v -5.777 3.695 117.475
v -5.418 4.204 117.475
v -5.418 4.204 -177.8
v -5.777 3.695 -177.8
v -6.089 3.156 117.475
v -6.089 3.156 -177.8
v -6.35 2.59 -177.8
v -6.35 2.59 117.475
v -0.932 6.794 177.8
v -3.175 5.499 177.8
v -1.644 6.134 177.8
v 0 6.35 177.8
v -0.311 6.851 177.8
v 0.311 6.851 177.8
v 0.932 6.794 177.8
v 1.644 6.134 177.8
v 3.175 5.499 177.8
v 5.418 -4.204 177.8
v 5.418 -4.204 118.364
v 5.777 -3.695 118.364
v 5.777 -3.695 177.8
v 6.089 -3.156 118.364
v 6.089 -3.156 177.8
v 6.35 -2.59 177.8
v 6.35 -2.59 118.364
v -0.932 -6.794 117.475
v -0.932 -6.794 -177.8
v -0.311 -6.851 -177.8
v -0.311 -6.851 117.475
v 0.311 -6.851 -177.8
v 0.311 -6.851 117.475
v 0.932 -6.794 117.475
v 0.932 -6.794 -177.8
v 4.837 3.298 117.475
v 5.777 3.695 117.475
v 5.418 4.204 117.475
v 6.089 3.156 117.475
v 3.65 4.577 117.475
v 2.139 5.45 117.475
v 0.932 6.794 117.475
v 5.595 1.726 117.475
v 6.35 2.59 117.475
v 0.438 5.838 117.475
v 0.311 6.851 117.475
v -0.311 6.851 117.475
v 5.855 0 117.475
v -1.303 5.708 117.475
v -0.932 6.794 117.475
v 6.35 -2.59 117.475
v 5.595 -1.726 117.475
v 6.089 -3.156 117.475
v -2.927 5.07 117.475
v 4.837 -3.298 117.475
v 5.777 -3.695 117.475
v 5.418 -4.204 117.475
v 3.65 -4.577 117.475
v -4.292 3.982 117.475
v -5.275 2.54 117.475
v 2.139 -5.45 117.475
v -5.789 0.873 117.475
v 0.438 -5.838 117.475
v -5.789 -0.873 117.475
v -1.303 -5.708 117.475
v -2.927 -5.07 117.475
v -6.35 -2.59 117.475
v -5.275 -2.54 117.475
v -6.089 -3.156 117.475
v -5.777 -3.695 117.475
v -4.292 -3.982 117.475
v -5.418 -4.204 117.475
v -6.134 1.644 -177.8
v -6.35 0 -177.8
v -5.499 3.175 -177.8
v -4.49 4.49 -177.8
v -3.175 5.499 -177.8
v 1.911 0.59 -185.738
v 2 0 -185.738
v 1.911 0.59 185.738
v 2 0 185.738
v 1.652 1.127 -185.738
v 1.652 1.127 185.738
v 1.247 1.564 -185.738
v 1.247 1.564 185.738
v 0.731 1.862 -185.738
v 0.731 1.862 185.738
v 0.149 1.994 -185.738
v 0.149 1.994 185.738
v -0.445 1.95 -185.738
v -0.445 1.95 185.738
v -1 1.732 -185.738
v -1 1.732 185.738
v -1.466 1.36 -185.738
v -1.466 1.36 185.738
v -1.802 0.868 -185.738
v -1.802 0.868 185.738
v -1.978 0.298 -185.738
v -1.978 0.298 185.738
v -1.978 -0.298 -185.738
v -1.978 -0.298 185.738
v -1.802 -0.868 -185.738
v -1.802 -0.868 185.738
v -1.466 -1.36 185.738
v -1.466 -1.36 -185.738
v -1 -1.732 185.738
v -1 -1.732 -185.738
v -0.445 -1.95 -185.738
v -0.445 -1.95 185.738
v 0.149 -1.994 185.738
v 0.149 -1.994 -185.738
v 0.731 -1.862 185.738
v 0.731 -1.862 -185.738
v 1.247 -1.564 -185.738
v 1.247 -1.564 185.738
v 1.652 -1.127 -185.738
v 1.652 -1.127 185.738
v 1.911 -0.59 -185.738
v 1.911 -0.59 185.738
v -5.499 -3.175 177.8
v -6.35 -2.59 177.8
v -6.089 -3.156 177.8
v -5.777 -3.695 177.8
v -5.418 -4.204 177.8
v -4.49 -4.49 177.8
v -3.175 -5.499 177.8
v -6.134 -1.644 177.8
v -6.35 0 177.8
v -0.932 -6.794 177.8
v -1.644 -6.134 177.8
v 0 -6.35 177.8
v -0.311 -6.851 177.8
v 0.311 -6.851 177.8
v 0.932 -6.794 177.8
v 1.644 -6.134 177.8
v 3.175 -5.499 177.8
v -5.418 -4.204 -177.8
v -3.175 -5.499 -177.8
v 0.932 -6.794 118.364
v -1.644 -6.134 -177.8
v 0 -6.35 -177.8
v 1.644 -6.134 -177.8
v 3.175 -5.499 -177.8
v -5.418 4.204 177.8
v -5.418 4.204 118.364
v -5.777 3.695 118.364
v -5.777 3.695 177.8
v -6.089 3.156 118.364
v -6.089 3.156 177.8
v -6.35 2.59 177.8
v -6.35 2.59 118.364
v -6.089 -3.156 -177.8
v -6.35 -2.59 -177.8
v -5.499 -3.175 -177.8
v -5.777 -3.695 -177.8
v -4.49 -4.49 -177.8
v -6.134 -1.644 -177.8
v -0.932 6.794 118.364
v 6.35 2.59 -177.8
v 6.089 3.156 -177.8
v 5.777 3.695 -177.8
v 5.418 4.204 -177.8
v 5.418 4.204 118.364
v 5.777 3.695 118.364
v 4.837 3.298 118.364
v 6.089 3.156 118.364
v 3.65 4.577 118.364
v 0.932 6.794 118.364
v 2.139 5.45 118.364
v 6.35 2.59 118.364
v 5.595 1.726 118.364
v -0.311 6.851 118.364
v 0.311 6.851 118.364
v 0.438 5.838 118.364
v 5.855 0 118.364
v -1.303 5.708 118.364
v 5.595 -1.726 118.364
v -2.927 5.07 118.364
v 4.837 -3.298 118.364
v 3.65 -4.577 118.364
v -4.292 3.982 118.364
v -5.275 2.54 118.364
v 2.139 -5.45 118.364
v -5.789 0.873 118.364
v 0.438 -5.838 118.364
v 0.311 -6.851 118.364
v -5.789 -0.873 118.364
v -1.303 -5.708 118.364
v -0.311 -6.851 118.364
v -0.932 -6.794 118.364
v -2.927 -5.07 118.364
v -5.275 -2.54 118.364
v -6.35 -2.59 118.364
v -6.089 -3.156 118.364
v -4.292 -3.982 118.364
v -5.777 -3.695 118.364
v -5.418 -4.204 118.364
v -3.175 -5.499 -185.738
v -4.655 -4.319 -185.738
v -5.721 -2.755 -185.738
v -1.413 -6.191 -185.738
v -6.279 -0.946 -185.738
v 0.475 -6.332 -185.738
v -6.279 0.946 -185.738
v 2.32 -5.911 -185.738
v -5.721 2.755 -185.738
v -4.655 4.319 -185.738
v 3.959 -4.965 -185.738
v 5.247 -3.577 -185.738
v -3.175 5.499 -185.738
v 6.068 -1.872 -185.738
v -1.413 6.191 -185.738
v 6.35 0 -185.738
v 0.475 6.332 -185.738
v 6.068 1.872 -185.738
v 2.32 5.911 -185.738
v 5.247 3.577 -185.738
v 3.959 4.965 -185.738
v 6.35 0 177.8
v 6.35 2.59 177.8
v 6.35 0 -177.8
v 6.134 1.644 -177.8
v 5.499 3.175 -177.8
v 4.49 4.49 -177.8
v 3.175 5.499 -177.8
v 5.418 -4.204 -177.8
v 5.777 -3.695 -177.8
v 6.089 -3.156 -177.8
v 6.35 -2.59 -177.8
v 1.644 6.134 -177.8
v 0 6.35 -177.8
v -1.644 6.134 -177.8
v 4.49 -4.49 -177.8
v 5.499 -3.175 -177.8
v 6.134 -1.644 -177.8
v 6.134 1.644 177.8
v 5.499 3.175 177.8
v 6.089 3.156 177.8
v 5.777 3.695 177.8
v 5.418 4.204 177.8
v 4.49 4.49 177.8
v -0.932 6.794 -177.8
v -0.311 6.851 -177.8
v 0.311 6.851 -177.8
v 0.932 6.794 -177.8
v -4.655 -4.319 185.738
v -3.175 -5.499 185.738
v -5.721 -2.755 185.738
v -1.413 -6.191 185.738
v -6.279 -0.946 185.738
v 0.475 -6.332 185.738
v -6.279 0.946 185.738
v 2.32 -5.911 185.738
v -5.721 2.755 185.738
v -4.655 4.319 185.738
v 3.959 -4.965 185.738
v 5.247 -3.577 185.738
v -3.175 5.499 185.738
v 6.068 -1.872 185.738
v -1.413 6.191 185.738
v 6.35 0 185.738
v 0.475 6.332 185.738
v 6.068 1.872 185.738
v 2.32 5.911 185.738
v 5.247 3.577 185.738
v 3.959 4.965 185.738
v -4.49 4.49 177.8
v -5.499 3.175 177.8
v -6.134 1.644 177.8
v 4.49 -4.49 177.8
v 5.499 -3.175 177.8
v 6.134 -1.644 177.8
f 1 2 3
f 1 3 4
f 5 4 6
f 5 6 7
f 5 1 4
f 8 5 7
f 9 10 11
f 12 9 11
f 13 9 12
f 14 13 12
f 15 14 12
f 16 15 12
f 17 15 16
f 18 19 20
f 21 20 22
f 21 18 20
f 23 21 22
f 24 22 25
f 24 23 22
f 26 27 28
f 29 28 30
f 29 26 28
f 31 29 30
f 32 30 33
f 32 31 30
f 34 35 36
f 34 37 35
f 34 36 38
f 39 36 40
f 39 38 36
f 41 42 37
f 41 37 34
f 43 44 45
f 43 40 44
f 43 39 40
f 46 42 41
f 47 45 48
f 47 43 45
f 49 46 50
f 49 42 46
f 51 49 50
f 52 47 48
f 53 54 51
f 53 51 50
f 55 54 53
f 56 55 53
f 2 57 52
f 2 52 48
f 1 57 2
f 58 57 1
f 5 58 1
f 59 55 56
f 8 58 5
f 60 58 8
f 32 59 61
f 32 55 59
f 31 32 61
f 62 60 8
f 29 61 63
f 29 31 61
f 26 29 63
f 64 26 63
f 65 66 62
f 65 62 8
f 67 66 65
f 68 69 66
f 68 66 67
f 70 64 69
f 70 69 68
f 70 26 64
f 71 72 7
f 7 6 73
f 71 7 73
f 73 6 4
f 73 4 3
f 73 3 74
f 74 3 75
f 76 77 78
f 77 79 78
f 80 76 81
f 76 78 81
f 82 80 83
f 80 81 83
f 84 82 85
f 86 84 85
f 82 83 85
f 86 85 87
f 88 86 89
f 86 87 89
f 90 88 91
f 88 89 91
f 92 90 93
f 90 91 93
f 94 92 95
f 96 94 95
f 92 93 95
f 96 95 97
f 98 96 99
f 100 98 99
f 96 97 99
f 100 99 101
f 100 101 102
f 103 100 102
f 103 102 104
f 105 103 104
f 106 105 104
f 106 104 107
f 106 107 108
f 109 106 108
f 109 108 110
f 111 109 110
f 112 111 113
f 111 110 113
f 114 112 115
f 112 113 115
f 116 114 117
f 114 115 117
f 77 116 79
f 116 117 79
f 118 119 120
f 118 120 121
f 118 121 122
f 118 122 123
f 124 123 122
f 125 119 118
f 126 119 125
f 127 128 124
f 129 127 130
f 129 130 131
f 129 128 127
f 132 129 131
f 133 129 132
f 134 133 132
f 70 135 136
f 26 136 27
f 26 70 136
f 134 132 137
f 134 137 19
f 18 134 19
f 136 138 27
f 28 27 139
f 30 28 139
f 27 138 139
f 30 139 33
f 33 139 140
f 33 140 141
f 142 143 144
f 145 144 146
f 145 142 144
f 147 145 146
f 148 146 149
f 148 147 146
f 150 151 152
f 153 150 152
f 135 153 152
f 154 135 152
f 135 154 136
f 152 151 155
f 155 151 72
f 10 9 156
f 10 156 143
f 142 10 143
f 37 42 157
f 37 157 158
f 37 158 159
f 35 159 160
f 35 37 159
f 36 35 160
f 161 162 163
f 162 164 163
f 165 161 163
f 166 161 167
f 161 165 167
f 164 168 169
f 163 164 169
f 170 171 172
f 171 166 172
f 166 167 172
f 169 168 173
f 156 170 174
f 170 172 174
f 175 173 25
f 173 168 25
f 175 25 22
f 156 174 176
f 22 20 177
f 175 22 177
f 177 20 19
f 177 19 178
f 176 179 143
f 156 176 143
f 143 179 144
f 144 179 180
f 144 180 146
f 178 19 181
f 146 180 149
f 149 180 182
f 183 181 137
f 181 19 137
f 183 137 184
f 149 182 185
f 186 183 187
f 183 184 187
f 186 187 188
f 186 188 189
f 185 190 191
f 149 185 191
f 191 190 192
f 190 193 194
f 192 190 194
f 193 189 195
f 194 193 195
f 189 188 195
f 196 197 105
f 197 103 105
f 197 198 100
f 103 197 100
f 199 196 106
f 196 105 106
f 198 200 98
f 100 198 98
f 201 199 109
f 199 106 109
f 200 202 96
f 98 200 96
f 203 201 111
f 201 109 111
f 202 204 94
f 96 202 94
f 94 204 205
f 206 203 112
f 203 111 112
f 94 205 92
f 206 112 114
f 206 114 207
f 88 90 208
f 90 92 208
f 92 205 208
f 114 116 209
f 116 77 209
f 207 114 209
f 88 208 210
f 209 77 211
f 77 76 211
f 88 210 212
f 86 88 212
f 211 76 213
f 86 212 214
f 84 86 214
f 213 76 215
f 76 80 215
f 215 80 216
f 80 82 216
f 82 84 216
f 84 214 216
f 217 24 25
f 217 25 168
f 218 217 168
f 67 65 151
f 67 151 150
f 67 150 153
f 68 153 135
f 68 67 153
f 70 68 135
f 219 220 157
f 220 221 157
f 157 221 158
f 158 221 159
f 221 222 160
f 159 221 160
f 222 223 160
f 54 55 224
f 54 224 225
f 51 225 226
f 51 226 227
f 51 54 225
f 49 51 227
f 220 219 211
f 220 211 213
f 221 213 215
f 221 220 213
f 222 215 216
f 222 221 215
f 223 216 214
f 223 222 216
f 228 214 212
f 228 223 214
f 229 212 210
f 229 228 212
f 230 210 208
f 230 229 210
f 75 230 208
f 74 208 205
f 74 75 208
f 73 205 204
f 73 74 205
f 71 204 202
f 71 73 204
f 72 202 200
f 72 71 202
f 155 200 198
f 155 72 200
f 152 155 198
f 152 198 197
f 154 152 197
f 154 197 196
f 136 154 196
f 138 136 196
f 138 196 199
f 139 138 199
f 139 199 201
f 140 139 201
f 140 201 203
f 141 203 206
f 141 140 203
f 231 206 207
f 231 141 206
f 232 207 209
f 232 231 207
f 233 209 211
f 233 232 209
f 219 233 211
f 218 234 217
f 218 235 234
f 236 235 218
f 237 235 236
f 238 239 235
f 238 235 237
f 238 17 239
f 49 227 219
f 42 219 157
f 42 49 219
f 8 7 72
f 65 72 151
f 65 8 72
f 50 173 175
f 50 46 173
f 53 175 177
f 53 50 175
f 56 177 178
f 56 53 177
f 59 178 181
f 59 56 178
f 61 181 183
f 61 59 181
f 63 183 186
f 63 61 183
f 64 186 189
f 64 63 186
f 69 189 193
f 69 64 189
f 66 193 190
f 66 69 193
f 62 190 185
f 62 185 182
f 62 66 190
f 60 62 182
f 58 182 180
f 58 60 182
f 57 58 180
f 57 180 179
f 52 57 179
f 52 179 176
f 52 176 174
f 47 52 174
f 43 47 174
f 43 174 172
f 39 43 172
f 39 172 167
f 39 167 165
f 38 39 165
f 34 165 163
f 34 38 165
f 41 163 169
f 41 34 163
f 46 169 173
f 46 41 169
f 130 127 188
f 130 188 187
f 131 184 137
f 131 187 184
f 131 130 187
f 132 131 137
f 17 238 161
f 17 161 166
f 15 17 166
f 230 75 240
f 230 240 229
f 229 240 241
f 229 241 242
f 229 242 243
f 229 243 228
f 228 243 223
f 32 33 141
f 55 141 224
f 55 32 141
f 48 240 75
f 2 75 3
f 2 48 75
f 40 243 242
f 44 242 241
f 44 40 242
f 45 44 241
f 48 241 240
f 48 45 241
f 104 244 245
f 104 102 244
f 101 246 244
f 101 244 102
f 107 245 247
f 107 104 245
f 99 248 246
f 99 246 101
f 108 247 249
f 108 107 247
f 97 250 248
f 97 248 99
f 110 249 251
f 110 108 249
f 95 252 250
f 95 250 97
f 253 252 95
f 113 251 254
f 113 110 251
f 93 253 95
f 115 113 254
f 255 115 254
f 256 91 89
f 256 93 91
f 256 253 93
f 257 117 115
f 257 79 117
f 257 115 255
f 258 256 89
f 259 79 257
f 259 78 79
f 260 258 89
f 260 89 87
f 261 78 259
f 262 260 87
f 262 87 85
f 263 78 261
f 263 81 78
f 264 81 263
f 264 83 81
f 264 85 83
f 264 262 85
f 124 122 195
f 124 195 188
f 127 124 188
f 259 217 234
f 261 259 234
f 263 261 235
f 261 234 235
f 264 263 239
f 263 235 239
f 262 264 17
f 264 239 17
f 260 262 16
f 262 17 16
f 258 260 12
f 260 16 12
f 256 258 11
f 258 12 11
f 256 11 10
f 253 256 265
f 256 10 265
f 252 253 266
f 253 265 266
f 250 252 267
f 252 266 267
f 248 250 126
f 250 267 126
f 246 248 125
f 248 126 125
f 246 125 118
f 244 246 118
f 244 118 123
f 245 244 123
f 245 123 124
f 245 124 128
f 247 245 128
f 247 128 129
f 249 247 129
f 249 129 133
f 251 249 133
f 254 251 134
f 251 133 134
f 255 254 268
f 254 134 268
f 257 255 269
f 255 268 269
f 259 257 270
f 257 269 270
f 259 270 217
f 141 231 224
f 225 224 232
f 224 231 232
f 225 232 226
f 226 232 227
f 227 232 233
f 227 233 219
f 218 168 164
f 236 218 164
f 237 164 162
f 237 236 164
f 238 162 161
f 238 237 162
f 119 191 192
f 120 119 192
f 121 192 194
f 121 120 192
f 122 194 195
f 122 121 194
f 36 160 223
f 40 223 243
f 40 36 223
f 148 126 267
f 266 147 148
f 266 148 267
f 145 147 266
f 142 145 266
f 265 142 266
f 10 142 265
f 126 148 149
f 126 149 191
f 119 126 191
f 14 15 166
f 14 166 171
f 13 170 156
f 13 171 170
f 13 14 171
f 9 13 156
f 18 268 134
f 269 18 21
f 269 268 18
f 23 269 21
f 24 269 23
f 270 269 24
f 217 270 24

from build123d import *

# Parameters (mm, degrees)
SKETCH1_R           = 2.000000064
BOSS_EXTRUDE1_DEPTH = 177.8
SKETCH3_R           = 6.35
SKETCH3_R_2         = 2.000000064
BOSS_EXTRUDE3_DEPTH = 7.9375
SKETCH5_W           = 0.889
SKETCH5_H           = 1.0033


with BuildPart() as part:
    # Sketch1 → Boss-Extrude1 (new, symmetric)
    with BuildSketch(Plane.XY):
        with BuildLine():
            ThreePointArc((0.93173274, 6.79441227), (0, 6.858), (-0.93173274, 6.79441227))
            Line((-0.93173274, 6.79441227), (-5.41826726, 4.204110358))
            ThreePointArc((-5.41826726, 4.204110358), (-5.939202219, 3.429), (-6.35, 2.590301913))
            Line((-6.35, 2.590301913), (-6.35, -2.590301913))
            ThreePointArc((-6.35, -2.590301913), (-5.939202219, -3.429), (-5.41826726, -4.204110358))
            Line((-5.41826726, -4.204110358), (-0.93173274, -6.79441227))
            ThreePointArc((-0.93173274, -6.79441227), (0, -6.858), (0.93173274, -6.79441227))
            Line((0.93173274, -6.79441227), (5.41826726, -4.204110358))
            ThreePointArc((5.41826726, -4.204110358), (5.939202219, -3.429), (6.35, -2.590301913))
            Line((6.35, -2.590301913), (6.35, 2.590301913))
            ThreePointArc((6.35, 2.590301913), (5.939202219, 3.429), (5.41826726, 4.204110358))
            Line((5.41826726, 4.204110358), (0.93173274, 6.79441227))
        make_face()
        Circle(SKETCH1_R, mode=Mode.SUBTRACT)
    extrude(amount=BOSS_EXTRUDE1_DEPTH, both=True)

    # Sketch3 → Boss-Extrude3 (add)
    with BuildSketch(Plane.XY.offset(177.8)):
        Circle(SKETCH3_R)
        Circle(SKETCH3_R_2, mode=Mode.SUBTRACT)
    boss_extrude3 = extrude(amount=BOSS_EXTRUDE3_DEPTH)

    # Mirror1: Boss-Extrude3 across plane
    add(boss_extrude3.mirror(Plane.XY))

    # Sketch5 → Cut-Revolve1 (revolve, cut)
    with BuildSketch(Plane(origin=(0, 0, 0), x_dir=(0, 0, -1), z_dir=(1, 0, 0)), mode=Mode.PRIVATE) as cut_revolve1_sk:
        with Locations((-117.9195, 6.35635)):
            Rectangle(SKETCH5_W, SKETCH5_H)
    revolve(cut_revolve1_sk.sketch.rotate(Axis((0, 0, 0), (0, 0, -1)), 90), axis=Axis((0, 0, 0), (0, 0, -1)), mode=Mode.SUBTRACT)


solid = part.part
